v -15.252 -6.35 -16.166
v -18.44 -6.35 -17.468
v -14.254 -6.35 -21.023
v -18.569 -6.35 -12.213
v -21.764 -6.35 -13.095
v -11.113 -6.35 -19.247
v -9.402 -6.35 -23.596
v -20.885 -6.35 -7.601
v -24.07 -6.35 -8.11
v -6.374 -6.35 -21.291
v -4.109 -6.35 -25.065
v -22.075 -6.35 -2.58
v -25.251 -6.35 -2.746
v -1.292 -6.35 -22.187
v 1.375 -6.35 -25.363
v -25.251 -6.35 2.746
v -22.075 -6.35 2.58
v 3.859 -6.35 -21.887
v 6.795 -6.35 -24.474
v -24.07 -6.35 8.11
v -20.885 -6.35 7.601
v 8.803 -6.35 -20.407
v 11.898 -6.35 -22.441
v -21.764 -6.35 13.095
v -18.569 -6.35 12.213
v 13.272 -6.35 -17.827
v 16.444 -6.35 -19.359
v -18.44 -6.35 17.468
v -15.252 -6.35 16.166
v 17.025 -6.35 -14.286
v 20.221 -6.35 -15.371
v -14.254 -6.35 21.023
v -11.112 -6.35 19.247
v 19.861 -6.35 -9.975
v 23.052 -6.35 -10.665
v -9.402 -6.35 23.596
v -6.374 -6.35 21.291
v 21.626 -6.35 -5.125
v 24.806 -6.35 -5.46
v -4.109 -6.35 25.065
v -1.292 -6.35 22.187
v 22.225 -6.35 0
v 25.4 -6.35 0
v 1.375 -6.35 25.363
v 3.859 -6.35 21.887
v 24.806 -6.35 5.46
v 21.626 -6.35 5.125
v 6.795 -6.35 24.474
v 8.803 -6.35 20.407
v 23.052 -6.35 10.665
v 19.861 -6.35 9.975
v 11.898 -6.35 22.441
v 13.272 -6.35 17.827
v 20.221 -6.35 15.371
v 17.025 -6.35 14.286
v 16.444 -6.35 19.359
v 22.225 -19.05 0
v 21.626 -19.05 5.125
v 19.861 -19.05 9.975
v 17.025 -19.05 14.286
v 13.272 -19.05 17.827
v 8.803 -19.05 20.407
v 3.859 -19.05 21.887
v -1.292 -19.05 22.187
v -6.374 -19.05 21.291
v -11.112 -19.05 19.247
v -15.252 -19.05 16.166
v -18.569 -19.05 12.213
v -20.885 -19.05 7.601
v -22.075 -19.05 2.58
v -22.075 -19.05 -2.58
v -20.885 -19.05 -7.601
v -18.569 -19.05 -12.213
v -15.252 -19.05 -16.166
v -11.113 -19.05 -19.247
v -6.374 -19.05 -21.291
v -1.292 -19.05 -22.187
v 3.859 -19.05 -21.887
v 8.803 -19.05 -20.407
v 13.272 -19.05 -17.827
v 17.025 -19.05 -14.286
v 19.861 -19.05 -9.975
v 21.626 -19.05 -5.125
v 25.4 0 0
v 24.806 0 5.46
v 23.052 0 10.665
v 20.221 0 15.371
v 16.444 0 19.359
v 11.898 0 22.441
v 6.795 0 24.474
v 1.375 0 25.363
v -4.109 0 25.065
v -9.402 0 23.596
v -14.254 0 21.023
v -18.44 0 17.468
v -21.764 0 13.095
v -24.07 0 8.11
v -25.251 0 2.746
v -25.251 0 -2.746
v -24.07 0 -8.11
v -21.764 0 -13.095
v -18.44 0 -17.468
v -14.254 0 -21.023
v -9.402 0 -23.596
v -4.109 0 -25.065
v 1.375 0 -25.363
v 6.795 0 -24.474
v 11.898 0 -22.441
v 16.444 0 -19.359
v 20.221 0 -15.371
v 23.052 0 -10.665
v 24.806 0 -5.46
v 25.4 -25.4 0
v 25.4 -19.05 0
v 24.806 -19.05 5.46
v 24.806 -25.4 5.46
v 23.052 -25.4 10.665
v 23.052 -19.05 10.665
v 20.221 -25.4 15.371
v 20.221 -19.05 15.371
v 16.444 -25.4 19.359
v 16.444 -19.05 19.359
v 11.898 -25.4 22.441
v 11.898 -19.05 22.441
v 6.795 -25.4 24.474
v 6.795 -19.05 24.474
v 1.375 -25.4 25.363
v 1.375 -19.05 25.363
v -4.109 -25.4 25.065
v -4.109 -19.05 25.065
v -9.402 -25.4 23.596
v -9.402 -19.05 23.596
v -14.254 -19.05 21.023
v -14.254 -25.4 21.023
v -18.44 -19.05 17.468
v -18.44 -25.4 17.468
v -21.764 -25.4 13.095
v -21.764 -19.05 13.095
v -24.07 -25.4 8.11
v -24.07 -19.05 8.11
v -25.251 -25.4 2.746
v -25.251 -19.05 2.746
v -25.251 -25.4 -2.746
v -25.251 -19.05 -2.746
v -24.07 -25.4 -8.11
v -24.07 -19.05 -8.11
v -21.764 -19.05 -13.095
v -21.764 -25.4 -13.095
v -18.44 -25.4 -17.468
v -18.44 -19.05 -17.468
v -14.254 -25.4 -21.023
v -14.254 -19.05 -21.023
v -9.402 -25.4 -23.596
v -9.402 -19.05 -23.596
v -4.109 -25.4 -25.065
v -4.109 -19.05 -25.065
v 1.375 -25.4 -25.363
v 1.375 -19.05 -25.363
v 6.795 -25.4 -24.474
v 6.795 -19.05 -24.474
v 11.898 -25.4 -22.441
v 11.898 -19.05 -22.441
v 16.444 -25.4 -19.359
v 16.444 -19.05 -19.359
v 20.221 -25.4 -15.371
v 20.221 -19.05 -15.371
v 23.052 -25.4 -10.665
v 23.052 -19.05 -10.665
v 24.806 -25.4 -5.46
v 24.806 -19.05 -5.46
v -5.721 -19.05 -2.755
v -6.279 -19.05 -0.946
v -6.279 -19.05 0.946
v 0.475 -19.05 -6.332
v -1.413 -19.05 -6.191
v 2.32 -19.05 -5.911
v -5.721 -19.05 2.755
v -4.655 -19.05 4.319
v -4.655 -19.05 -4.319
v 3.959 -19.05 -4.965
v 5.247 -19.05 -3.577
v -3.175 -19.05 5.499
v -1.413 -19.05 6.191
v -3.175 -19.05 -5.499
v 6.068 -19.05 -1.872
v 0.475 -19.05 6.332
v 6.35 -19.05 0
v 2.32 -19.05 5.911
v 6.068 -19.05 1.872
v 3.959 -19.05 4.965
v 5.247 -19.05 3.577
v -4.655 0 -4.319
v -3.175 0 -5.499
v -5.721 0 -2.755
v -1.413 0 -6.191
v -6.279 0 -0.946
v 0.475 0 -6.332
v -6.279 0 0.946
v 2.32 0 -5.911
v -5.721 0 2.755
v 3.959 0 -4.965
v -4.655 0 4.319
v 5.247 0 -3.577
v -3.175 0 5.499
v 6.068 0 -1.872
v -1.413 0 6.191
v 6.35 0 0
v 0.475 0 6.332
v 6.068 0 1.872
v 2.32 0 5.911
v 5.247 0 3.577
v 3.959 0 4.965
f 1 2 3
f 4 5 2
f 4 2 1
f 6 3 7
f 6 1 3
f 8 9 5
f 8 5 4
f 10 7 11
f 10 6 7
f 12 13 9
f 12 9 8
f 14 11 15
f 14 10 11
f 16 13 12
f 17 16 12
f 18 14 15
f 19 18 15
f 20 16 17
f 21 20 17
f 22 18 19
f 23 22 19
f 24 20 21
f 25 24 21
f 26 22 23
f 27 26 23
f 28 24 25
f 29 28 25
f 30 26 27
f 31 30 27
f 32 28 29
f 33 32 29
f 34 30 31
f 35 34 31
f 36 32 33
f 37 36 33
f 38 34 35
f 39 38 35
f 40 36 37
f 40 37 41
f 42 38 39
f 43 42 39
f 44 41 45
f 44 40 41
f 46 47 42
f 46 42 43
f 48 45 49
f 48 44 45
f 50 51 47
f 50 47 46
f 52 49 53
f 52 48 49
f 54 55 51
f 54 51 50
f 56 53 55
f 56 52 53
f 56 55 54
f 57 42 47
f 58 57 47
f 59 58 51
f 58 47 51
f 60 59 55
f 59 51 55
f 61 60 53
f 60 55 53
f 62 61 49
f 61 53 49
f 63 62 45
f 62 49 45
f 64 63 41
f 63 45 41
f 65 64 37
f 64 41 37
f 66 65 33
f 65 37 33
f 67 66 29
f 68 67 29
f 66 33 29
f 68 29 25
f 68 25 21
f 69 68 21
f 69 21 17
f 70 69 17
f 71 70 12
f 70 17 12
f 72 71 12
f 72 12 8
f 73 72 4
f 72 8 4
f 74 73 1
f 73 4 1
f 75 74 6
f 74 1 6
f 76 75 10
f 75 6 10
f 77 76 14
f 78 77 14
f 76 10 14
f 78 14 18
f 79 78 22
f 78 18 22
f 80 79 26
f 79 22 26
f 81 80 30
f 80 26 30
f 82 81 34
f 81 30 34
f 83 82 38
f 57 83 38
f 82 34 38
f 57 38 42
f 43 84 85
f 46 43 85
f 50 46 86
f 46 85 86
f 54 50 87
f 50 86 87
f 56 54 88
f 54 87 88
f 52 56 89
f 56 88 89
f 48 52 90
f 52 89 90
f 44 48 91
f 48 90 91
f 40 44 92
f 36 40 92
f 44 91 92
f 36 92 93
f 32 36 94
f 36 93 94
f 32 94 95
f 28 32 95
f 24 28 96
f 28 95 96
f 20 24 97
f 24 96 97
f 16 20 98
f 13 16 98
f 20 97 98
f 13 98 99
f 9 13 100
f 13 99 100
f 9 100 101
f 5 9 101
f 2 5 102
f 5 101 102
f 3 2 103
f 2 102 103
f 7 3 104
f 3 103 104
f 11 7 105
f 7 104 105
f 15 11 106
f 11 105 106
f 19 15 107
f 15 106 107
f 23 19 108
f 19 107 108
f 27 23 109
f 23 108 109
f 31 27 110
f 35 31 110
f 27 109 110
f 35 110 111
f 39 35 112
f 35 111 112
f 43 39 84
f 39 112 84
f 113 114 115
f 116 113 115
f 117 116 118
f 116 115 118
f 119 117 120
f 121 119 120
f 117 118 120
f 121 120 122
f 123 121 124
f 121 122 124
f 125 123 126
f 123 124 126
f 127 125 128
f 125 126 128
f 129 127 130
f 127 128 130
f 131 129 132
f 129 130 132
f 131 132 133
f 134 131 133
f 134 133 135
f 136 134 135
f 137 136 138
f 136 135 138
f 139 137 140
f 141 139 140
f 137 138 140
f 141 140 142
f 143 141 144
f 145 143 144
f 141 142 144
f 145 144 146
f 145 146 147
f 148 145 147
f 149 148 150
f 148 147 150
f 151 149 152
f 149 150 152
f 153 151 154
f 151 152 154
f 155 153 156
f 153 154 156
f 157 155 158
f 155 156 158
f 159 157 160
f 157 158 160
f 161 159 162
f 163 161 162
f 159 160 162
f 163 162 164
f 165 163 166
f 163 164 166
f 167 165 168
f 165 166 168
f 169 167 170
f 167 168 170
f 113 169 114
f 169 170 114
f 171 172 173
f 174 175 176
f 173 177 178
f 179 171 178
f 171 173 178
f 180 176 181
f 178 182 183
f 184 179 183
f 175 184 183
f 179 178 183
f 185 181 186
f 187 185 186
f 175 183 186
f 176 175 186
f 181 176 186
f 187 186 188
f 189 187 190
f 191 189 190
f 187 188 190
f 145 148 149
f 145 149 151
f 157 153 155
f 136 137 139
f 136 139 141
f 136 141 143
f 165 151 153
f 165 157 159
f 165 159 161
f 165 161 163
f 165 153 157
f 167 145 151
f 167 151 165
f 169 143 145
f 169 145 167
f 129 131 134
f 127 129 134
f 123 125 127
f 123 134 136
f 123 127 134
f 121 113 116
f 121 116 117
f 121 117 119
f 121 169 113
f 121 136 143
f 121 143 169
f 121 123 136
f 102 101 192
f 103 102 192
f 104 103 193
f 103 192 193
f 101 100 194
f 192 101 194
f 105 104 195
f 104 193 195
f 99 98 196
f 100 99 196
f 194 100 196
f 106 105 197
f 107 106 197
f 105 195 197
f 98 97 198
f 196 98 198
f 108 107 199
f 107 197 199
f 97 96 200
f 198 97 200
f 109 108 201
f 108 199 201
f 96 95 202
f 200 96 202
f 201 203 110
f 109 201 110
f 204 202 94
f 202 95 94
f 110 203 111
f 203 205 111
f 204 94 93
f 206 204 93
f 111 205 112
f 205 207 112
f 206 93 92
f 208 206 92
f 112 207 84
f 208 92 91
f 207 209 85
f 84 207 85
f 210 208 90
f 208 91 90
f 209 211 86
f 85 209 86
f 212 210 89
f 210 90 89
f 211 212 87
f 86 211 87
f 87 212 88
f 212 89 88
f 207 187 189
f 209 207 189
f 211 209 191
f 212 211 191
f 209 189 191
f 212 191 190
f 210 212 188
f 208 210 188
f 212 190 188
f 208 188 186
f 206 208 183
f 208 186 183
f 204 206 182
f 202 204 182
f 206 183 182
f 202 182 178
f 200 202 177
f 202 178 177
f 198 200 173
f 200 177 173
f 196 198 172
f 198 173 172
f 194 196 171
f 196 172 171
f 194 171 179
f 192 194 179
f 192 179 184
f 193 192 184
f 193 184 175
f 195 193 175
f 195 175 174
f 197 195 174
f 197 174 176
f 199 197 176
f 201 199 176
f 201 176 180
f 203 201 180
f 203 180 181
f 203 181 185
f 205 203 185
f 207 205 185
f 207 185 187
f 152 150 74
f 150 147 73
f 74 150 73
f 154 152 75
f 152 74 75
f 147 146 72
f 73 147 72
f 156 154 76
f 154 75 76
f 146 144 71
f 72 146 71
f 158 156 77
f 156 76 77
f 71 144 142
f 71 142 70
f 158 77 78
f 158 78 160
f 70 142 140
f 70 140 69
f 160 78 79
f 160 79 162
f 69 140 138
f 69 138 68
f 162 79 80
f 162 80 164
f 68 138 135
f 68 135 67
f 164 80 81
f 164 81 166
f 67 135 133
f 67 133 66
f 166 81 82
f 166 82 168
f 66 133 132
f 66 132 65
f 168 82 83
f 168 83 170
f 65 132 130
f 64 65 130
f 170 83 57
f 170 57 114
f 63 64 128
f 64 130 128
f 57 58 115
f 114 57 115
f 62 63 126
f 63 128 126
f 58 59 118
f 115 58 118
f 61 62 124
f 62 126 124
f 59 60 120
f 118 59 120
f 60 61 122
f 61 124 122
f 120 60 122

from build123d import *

# Parameters (mm, degrees)
F0_R     = 25.4
F1_DEPTH = 6.35
F2_R     = 22.225
F3_DEPTH = 12.7
F4_R     = 6.35
F5_DEPTH = 19.051
F6_R     = 25.4
F7_DEPTH = 6.35


with BuildPart() as f1:
    # F0 (on Front) → F1 (new body)
    with BuildSketch(Plane.XZ):
        Circle(F0_R)
    extrude(amount=F1_DEPTH)

    # F2 (on face) → F3 (join)
    with BuildSketch(Plane.XZ.offset(6.35)):
        Circle(F2_R)
    extrude(amount=F3_DEPTH)

    # F4 (on face) → F5 (cut, through all)
    with BuildSketch(Plane.XZ.offset(19.05)):
        Circle(F4_R)
    extrude(amount=-F5_DEPTH, mode=Mode.SUBTRACT)

    # F6 (on face) → F7 (join)
    with BuildSketch(Plane.XZ.offset(19.05)):
        Circle(F6_R)
    extrude(amount=F7_DEPTH)


solid = f1.part
